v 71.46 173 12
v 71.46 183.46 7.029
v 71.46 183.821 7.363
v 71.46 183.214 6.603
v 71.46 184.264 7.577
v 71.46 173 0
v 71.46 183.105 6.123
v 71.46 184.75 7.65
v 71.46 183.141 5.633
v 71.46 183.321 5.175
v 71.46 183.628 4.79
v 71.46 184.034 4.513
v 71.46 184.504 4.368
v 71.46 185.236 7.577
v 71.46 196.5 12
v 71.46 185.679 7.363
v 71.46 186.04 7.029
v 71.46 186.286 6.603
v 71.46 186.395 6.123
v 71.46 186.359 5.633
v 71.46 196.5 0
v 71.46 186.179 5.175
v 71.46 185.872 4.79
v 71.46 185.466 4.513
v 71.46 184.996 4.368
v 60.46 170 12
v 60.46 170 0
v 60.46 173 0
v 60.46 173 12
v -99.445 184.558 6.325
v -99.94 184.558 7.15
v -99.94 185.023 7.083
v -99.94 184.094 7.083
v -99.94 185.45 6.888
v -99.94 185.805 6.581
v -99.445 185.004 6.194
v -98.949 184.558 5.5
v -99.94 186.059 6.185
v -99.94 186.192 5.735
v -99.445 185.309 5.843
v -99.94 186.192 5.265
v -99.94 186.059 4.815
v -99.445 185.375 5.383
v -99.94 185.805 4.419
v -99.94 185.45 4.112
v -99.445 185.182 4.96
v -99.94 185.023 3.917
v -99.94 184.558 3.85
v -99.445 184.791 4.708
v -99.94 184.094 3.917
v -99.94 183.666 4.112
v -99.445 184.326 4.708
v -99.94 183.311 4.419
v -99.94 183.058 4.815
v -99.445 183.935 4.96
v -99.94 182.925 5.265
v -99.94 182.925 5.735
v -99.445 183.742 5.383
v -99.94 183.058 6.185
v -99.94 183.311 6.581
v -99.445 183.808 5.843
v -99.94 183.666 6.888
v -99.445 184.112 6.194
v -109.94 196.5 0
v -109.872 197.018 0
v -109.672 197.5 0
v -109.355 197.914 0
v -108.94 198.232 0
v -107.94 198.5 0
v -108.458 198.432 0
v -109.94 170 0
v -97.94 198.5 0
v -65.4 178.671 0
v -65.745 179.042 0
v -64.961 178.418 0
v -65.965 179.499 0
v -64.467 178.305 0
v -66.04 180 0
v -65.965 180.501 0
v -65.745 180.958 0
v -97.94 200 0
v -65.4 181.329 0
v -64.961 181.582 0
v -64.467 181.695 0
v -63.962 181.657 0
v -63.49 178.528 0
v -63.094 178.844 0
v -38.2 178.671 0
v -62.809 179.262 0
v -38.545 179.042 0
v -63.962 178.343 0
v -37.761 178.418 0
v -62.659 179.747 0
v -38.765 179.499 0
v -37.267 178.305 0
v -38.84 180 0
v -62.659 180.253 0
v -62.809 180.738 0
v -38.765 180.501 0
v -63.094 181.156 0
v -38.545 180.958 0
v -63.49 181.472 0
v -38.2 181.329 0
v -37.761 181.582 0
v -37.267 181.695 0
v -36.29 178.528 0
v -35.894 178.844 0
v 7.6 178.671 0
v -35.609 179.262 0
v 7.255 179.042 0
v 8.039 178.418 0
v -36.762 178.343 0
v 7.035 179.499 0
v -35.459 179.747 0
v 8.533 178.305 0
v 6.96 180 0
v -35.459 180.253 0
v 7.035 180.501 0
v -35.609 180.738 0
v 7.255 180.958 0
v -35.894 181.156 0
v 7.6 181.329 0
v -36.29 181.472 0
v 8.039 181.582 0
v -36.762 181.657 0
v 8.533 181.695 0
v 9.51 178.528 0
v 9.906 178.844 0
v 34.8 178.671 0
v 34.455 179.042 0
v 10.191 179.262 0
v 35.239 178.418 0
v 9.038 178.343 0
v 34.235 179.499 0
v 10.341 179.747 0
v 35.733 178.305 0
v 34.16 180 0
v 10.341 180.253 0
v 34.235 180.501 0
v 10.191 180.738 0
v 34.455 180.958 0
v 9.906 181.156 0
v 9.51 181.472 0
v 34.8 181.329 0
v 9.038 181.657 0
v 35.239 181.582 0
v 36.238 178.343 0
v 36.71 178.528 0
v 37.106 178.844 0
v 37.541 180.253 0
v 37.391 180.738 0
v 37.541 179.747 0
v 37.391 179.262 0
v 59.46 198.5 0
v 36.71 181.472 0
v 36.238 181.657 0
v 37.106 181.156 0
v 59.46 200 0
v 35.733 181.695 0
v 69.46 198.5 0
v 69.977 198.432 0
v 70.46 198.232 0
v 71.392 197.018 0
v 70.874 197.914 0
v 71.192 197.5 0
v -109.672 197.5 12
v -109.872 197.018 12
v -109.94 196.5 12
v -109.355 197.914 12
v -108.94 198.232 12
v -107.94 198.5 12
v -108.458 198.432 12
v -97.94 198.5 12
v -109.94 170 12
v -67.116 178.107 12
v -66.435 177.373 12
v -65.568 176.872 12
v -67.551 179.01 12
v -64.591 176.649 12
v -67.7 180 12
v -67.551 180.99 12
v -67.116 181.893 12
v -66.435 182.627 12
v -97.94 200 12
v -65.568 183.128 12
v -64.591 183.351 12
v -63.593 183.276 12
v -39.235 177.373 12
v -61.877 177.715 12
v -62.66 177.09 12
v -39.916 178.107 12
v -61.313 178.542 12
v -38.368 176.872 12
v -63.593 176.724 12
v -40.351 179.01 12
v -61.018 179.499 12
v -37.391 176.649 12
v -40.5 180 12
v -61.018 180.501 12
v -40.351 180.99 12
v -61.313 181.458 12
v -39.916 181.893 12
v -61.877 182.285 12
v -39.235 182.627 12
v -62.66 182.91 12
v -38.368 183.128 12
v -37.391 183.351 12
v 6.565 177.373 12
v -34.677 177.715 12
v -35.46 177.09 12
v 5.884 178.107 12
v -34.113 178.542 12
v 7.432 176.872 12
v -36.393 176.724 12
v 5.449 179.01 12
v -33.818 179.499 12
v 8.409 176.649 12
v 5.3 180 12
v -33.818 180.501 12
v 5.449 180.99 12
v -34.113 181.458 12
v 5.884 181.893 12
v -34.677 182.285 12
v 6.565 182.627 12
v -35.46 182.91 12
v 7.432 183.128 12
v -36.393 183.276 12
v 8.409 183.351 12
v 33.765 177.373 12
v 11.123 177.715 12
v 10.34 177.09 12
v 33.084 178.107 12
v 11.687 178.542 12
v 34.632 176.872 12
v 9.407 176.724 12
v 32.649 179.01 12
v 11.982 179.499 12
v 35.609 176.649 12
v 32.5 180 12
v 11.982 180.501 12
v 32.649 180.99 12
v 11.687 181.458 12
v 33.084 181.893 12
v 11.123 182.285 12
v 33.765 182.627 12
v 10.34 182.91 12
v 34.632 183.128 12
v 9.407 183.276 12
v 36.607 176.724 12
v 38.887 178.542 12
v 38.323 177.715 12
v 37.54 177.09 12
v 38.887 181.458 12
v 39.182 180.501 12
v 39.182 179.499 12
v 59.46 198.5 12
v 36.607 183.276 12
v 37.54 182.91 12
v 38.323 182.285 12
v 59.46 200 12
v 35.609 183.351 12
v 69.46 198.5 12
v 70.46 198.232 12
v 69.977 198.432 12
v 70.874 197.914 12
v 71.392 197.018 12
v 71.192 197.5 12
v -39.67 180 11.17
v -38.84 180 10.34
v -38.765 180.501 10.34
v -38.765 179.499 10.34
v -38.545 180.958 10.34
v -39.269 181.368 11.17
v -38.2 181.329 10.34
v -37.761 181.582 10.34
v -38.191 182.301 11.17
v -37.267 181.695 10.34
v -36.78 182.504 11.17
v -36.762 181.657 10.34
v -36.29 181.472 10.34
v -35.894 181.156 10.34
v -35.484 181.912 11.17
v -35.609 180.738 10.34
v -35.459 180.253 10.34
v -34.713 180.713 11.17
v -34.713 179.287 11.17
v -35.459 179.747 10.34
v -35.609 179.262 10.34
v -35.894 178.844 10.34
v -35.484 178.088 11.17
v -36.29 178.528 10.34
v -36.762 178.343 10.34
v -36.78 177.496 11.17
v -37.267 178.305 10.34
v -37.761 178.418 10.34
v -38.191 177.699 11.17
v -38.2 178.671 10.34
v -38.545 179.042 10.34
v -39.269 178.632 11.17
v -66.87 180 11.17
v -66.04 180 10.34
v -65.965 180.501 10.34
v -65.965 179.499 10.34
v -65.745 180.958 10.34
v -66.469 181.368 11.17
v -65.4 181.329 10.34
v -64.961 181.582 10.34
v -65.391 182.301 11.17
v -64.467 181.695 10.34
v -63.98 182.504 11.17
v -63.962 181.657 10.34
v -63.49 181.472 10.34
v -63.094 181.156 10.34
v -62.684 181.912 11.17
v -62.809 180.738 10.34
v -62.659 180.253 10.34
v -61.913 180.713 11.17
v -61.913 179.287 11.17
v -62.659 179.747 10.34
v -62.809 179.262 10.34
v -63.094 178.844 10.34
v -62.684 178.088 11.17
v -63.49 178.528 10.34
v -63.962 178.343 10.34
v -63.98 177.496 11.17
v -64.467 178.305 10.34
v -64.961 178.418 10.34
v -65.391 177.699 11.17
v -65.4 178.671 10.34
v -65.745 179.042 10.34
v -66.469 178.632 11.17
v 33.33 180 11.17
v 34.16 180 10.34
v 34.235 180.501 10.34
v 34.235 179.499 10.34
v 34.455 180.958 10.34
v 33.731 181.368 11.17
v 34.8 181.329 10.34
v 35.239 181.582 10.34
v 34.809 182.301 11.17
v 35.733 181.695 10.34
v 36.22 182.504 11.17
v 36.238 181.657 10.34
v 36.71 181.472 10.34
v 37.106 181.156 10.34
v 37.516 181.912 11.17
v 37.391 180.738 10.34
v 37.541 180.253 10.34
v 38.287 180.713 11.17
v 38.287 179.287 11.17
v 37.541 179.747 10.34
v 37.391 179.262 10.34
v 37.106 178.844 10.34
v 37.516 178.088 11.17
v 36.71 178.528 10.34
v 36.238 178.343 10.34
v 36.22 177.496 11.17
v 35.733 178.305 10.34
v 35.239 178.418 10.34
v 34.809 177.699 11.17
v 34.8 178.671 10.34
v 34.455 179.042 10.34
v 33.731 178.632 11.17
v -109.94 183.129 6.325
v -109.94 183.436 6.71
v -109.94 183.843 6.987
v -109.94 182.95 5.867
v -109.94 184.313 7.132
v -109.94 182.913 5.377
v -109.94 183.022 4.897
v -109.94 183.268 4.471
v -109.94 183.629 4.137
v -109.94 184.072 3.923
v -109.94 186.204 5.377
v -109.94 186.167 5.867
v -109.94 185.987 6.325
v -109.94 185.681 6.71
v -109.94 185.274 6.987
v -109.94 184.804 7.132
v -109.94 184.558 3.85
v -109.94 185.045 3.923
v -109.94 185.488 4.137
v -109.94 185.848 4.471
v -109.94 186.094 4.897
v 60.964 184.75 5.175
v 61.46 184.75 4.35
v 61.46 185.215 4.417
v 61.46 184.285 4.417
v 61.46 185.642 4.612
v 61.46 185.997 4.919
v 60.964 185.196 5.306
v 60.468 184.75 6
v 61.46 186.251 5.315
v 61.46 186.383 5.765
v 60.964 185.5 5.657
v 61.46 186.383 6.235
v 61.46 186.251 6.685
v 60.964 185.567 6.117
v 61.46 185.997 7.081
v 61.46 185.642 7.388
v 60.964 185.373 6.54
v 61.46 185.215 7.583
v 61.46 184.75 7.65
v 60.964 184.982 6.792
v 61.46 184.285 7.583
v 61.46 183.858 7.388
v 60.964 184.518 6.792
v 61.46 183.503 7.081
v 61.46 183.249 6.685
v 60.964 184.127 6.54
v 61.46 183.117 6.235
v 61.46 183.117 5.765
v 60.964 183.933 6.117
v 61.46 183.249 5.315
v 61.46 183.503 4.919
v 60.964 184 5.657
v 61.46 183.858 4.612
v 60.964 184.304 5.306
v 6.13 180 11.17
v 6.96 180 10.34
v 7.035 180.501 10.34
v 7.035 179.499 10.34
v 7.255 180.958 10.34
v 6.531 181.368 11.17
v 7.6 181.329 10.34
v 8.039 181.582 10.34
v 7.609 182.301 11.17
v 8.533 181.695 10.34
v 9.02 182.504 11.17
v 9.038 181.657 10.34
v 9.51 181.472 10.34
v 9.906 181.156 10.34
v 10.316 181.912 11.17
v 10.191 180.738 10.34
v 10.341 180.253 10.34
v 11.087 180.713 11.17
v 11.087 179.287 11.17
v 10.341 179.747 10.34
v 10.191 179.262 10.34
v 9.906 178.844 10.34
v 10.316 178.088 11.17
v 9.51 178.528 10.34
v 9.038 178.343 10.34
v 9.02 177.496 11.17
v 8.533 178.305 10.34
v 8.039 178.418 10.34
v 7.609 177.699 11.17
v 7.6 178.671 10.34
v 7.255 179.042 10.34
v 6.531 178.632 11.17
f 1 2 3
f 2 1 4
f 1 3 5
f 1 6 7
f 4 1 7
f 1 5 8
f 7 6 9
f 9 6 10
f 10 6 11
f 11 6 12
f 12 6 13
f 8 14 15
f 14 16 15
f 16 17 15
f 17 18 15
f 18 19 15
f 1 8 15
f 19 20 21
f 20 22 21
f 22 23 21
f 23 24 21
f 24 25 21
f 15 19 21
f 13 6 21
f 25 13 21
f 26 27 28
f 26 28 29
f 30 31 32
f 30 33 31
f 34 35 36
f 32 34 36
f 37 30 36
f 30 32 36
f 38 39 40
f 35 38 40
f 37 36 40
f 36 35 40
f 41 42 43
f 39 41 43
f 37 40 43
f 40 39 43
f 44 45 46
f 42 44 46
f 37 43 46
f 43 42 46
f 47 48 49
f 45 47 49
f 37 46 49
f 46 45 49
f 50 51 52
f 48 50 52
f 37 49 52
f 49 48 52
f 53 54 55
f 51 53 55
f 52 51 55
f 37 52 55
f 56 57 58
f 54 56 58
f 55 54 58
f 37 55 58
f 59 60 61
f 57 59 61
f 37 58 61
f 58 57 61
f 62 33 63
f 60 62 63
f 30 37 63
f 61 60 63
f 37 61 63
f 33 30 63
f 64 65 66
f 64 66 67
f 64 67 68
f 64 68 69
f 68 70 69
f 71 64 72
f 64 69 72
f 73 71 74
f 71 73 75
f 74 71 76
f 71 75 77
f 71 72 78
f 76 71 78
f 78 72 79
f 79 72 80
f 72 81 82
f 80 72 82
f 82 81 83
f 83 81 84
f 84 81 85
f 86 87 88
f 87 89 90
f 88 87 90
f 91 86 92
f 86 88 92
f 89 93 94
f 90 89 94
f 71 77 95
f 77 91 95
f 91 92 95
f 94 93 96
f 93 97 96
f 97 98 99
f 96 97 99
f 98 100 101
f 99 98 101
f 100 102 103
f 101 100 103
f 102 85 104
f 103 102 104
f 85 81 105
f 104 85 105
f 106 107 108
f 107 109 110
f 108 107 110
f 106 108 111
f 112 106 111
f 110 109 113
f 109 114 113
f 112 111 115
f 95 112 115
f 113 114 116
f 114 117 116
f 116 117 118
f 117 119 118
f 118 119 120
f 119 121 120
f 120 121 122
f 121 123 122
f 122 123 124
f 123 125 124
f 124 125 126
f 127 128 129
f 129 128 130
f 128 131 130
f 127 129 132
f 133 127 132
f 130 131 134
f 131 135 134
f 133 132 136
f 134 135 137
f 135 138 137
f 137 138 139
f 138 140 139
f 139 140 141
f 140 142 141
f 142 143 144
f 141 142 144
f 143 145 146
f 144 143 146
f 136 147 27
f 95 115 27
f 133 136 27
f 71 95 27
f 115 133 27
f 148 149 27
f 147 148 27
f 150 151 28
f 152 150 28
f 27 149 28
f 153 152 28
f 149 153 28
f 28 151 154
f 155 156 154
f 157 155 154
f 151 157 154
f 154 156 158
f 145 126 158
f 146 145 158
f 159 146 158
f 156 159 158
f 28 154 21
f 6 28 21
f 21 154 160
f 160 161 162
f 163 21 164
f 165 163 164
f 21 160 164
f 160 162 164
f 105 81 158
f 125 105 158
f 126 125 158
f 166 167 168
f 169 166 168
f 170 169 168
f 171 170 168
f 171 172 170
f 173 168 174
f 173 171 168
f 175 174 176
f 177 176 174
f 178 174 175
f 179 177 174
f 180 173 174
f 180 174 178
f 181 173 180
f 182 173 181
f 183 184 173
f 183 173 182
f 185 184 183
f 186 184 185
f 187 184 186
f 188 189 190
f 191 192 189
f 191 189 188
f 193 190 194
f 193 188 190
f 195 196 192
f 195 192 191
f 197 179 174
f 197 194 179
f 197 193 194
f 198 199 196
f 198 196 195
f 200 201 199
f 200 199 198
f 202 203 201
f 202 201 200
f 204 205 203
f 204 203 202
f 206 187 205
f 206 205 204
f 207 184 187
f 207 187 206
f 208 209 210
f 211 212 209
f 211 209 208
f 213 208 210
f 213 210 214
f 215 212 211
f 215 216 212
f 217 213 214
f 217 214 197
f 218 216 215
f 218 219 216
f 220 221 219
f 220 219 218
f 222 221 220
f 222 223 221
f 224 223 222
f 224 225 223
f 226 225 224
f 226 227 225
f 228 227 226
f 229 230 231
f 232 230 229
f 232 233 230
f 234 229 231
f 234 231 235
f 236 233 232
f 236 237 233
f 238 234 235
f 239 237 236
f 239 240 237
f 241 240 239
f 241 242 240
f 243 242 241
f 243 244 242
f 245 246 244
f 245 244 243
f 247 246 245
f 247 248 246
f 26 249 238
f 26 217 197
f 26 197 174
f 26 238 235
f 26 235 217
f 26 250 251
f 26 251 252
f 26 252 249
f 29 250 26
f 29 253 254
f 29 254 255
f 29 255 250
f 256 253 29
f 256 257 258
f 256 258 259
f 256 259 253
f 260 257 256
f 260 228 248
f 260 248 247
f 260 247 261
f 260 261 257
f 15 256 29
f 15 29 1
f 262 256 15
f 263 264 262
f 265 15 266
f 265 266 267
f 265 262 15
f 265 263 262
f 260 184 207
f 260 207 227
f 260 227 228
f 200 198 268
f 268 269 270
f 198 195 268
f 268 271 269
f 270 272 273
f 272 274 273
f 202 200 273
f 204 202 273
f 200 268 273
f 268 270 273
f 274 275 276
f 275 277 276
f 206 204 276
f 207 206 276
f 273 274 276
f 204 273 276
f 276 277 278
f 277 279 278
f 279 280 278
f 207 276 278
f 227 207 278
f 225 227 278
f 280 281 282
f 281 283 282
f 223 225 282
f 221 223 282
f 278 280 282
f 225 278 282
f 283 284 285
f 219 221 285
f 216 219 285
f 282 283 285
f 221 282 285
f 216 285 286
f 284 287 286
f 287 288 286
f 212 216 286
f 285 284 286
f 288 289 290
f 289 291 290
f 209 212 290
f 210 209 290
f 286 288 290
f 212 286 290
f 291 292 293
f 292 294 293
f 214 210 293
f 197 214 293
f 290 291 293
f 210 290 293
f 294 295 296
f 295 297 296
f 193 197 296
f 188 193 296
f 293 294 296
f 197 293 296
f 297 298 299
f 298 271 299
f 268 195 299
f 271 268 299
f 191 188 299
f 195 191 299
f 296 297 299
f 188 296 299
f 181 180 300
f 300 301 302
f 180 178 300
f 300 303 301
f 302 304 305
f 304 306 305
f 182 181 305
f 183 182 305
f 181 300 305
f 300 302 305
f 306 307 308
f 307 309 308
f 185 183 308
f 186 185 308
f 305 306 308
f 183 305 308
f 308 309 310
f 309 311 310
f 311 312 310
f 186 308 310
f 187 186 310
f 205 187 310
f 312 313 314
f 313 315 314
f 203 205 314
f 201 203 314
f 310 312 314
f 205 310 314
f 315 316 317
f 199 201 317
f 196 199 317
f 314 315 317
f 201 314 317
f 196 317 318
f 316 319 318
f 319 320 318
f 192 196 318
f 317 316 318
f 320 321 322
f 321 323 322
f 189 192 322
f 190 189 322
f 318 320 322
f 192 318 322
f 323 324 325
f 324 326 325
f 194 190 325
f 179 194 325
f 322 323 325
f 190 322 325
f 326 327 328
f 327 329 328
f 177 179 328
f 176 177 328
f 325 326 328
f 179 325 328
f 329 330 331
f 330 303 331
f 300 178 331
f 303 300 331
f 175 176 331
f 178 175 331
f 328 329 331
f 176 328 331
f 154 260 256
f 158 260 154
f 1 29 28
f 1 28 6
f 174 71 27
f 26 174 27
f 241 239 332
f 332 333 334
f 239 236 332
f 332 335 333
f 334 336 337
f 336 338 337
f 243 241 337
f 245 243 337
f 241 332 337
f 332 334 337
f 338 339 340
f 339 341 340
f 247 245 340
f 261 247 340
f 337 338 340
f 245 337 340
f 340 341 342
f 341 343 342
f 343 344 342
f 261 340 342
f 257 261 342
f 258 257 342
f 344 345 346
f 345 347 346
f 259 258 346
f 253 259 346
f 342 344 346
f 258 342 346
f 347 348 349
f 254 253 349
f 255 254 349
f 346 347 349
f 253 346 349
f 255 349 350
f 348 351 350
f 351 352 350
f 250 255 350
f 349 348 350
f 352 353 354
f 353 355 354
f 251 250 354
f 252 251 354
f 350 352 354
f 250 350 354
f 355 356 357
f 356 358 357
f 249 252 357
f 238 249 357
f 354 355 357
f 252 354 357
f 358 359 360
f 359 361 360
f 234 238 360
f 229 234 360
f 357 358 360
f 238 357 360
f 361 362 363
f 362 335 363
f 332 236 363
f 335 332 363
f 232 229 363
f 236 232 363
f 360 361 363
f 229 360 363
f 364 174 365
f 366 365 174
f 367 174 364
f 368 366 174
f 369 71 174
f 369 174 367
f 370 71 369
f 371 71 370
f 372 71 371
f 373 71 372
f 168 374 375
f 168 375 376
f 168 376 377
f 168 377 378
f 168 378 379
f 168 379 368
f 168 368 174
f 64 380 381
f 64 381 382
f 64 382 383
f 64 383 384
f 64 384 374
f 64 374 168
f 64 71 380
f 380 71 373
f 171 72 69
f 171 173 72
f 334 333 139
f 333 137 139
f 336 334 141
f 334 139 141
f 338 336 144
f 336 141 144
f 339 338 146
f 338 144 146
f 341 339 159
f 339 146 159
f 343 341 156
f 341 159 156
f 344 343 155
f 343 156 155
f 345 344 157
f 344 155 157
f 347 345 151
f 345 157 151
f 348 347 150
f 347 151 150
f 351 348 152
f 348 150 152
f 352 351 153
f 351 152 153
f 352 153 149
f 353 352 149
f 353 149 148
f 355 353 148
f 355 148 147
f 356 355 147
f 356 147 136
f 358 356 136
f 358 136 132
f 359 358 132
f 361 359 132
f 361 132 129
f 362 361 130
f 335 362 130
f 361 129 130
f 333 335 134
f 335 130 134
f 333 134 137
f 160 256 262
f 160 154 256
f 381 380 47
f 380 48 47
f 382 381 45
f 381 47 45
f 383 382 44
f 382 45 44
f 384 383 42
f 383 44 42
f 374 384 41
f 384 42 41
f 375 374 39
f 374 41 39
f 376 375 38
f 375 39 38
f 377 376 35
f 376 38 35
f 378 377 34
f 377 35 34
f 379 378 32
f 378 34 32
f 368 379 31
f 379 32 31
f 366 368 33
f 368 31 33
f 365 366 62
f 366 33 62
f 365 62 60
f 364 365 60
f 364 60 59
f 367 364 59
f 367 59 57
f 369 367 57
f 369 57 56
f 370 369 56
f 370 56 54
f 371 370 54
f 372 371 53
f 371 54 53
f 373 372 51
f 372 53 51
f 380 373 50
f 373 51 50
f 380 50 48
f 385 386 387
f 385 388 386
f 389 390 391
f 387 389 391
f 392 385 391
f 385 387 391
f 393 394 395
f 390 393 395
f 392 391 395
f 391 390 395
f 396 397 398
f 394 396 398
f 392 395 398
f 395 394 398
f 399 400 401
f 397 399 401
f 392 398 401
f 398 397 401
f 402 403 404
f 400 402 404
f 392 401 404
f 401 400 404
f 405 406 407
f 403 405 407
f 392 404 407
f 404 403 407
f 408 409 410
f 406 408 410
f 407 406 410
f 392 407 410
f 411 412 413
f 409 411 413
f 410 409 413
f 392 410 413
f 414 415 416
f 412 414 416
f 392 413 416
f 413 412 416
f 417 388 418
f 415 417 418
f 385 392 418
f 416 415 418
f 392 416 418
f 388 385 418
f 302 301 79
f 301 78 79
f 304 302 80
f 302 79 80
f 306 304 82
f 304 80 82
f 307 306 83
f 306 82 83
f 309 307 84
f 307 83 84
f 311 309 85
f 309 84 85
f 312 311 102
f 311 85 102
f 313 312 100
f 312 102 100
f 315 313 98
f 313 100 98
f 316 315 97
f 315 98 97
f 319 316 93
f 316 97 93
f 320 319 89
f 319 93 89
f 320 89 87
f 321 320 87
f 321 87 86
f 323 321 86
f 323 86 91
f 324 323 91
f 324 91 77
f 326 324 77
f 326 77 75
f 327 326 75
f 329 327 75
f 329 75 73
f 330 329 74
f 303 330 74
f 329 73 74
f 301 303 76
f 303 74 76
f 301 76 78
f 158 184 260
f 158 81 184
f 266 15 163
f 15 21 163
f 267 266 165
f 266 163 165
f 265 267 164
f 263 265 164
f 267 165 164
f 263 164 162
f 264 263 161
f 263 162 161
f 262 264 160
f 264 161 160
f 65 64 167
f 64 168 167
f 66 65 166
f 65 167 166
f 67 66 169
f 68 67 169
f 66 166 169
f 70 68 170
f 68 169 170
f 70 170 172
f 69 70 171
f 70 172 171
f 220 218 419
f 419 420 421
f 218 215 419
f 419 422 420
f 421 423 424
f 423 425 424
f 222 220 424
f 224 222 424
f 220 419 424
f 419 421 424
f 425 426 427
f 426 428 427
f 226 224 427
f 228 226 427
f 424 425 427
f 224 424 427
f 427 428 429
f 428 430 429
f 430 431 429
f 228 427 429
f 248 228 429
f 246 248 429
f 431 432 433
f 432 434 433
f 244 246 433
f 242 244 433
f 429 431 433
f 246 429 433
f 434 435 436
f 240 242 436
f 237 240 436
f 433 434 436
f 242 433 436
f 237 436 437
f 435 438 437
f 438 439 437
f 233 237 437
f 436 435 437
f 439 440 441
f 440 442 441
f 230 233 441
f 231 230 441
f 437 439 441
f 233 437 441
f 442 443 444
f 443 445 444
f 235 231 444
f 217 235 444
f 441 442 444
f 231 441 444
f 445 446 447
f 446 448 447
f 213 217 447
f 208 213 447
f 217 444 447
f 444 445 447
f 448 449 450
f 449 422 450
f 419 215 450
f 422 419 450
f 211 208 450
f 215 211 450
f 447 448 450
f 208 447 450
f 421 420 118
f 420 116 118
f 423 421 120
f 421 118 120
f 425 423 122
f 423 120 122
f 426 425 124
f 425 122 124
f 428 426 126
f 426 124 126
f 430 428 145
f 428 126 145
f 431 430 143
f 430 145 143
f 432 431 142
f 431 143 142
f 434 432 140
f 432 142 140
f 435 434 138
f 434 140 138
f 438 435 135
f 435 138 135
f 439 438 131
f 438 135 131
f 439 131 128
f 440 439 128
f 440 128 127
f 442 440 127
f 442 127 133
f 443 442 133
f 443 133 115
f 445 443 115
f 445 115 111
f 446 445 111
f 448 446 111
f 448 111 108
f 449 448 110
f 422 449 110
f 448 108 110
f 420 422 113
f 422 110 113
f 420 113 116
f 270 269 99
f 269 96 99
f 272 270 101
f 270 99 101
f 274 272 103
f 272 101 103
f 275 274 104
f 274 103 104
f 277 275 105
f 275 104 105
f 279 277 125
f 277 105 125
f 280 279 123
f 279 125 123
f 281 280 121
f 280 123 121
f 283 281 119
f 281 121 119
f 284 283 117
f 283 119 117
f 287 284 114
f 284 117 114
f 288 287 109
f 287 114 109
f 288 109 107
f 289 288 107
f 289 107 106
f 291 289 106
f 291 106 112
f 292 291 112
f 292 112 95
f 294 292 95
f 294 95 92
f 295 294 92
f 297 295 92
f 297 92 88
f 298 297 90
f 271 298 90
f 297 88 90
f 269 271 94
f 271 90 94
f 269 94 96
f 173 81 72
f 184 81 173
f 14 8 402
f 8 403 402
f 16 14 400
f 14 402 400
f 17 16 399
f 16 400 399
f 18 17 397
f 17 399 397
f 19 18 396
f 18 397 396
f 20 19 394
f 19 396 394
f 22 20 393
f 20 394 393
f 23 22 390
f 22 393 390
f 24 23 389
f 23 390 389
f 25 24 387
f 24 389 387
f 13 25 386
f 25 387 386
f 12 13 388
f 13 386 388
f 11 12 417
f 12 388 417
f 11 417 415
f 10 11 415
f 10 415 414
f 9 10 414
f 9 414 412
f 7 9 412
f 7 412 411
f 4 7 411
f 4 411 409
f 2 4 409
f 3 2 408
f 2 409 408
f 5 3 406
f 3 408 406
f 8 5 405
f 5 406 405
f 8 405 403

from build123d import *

# Parameters (mm, degrees)
ESBO_O1_W                                      = 119
ESBO_O1_H                                      = 30
RESSALTO_EXTRUS_O1_DEPTH                       = 12
ESCAREADO_PARA_SFHCS_M31_D                     = 3.4
ESCAREADO_PARA_SFHCS_M31_CSINK_D               = 6.72
ESCAREADO_PARA_SFHCS_M31_CSINK_ANGLE           = 90
ESBO_O6_W                                      = 36.2
ESBO_O6_H                                      = 30
RESSALTO_EXTRUS_O2_DEPTH                       = 12
ESBO_O7_W                                      = 26.2
ESBO_O7_H                                      = 30
RESSALTO_EXTRUS_O3_DEPTH                       = 12
ESBO_O8_W                                      = 12
ESBO_O8_H                                      = 12
CORTE_EXTRUS_O1_DEPTH                          = 1.5
FILETE1_R                                      = 2
ESBO_O9_W                                      = 11
ESBO_O9_H                                      = 12
CORTE_EXTRUS_O2_DEPTH                          = 3
BROCA_DE_ROSQUEAR_PARA_TARRAXA_DE_M4X0_7_D     = 3.3
BROCA_DE_ROSQUEAR_PARA_TARRAXA_DE_M4X0_7_DEPTH = 10
BROCA_DE_ROSQUEAR_PARA_TARRAXA_DE_M4X0_7_TIP   = 0.991420021
ESBO_O12_W                                     = 12
ESBO_O12_H                                     = 12
CORTE_EXTRUS_O3_DEPTH                          = 1.5
FILETE2_R                                      = 2
BROCA_DE_ROSQUEAR_PARA_TARRAXA_DE_M4_2_D       = 3.3
BROCA_DE_ROSQUEAR_PARA_TARRAXA_DE_M4_2_DEPTH   = 10
BROCA_DE_ROSQUEAR_PARA_TARRAXA_DE_M4_2_TIP     = 0.991420021


with BuildPart() as part:
    # Esboço1 → Ressalto-extrusão1 (new body)
    with BuildSketch(Plane.XY):
        with Locations((-14.240307174, 185)):
            Rectangle(ESBO_O1_W, ESBO_O1_H)
    extrude(amount=RESSALTO_EXTRUS_O1_DEPTH)

    # Escareado para SFHCS M31 (through all)
    with Locations(Plane.XY.offset(12)):
        with Locations((35.859692826, 180), (-64.340307174, 180), (-37.140307174, 180), (8.659692826, 180)):
            CounterSinkHole(ESCAREADO_PARA_SFHCS_M31_D / 2, ESCAREADO_PARA_SFHCS_M31_CSINK_D / 2, counter_sink_angle=ESCAREADO_PARA_SFHCS_M31_CSINK_ANGLE)

    # Esboço6 → Ressalto-extrusão2 (add)
    with BuildSketch(Plane.XY):
        with Locations((-91.840307174, 185)):
            Rectangle(ESBO_O6_W, ESBO_O6_H)
    extrude(amount=RESSALTO_EXTRUS_O2_DEPTH)

    # Esboço7 → Ressalto-extrusão3 (add)
    with BuildSketch(Plane.XY):
        with Locations((58.359692826, 185)):
            Rectangle(ESBO_O7_W, ESBO_O7_H)
    extrude(amount=RESSALTO_EXTRUS_O3_DEPTH)

    # Esboço8 → Corte-extrusão1 (cut)
    with BuildSketch(Plane(origin=(0, 200, 0), x_dir=(1, 0, 0), z_dir=(0, 1, 0))):
        with Locations((65.459692826, -6)):
            Rectangle(ESBO_O8_W, ESBO_O8_H)
    extrude(amount=-CORTE_EXTRUS_O1_DEPTH, mode=Mode.SUBTRACT)

    # Filete1
    filete1_edges = [part.edges().sort_by_distance(p)[0] for p in [
        (71.459692826, 198.5, 6),
    ]]
    fillet(filete1_edges, radius=FILETE1_R)

    # Esboço9 → Corte-extrusão2 (cut)
    with BuildSketch(Plane.XZ.offset(-170)):
        with Locations((65.959692826, 6)):
            Rectangle(ESBO_O9_W, ESBO_O9_H)
    extrude(amount=-CORTE_EXTRUS_O2_DEPTH, mode=Mode.SUBTRACT)

    # Broca de rosquear para tarraxa de M4x0.7
    with Locations(Plane(origin=(71.459692826, 0, 0), x_dir=(0, 0, -1), z_dir=(1, 0, 0))):
        with Locations((-6, 184.75)):
            Hole(BROCA_DE_ROSQUEAR_PARA_TARRAXA_DE_M4X0_7_D / 2, depth=BROCA_DE_ROSQUEAR_PARA_TARRAXA_DE_M4X0_7_DEPTH)
            with Locations((0, 0, -(BROCA_DE_ROSQUEAR_PARA_TARRAXA_DE_M4X0_7_DEPTH + BROCA_DE_ROSQUEAR_PARA_TARRAXA_DE_M4X0_7_TIP / 2))):  # 118° drill point
                Cone(0, BROCA_DE_ROSQUEAR_PARA_TARRAXA_DE_M4X0_7_D / 2, BROCA_DE_ROSQUEAR_PARA_TARRAXA_DE_M4X0_7_TIP, mode=Mode.SUBTRACT)

    # Esboço12 → Corte-extrusão3 (cut)
    with BuildSketch(Plane(origin=(0, 200, 0), x_dir=(-1, 0, 0), z_dir=(0, 1, 0))):
        with Locations((103.940307174, 6)):
            Rectangle(ESBO_O12_W, ESBO_O12_H)
    extrude(amount=-CORTE_EXTRUS_O3_DEPTH, mode=Mode.SUBTRACT)

    # Filete2
    filete2_edges = [part.edges().sort_by_distance(p)[0] for p in [
        (-109.940307174, 198.5, 6),
    ]]
    fillet(filete2_edges, radius=FILETE2_R)

    # Broca de rosquear para tarraxa de M4 2
    with Locations(Plane.ZY.offset(109.940307174)):
        with Locations((5.5, 184.558440573), (-130.6, 184.75)):
            Hole(BROCA_DE_ROSQUEAR_PARA_TARRAXA_DE_M4_2_D / 2, depth=BROCA_DE_ROSQUEAR_PARA_TARRAXA_DE_M4_2_DEPTH)
            with Locations((0, 0, -(BROCA_DE_ROSQUEAR_PARA_TARRAXA_DE_M4_2_DEPTH + BROCA_DE_ROSQUEAR_PARA_TARRAXA_DE_M4_2_TIP / 2))):  # 118° drill point
                Cone(0, BROCA_DE_ROSQUEAR_PARA_TARRAXA_DE_M4_2_D / 2, BROCA_DE_ROSQUEAR_PARA_TARRAXA_DE_M4_2_TIP, mode=Mode.SUBTRACT)


solid = part.part
